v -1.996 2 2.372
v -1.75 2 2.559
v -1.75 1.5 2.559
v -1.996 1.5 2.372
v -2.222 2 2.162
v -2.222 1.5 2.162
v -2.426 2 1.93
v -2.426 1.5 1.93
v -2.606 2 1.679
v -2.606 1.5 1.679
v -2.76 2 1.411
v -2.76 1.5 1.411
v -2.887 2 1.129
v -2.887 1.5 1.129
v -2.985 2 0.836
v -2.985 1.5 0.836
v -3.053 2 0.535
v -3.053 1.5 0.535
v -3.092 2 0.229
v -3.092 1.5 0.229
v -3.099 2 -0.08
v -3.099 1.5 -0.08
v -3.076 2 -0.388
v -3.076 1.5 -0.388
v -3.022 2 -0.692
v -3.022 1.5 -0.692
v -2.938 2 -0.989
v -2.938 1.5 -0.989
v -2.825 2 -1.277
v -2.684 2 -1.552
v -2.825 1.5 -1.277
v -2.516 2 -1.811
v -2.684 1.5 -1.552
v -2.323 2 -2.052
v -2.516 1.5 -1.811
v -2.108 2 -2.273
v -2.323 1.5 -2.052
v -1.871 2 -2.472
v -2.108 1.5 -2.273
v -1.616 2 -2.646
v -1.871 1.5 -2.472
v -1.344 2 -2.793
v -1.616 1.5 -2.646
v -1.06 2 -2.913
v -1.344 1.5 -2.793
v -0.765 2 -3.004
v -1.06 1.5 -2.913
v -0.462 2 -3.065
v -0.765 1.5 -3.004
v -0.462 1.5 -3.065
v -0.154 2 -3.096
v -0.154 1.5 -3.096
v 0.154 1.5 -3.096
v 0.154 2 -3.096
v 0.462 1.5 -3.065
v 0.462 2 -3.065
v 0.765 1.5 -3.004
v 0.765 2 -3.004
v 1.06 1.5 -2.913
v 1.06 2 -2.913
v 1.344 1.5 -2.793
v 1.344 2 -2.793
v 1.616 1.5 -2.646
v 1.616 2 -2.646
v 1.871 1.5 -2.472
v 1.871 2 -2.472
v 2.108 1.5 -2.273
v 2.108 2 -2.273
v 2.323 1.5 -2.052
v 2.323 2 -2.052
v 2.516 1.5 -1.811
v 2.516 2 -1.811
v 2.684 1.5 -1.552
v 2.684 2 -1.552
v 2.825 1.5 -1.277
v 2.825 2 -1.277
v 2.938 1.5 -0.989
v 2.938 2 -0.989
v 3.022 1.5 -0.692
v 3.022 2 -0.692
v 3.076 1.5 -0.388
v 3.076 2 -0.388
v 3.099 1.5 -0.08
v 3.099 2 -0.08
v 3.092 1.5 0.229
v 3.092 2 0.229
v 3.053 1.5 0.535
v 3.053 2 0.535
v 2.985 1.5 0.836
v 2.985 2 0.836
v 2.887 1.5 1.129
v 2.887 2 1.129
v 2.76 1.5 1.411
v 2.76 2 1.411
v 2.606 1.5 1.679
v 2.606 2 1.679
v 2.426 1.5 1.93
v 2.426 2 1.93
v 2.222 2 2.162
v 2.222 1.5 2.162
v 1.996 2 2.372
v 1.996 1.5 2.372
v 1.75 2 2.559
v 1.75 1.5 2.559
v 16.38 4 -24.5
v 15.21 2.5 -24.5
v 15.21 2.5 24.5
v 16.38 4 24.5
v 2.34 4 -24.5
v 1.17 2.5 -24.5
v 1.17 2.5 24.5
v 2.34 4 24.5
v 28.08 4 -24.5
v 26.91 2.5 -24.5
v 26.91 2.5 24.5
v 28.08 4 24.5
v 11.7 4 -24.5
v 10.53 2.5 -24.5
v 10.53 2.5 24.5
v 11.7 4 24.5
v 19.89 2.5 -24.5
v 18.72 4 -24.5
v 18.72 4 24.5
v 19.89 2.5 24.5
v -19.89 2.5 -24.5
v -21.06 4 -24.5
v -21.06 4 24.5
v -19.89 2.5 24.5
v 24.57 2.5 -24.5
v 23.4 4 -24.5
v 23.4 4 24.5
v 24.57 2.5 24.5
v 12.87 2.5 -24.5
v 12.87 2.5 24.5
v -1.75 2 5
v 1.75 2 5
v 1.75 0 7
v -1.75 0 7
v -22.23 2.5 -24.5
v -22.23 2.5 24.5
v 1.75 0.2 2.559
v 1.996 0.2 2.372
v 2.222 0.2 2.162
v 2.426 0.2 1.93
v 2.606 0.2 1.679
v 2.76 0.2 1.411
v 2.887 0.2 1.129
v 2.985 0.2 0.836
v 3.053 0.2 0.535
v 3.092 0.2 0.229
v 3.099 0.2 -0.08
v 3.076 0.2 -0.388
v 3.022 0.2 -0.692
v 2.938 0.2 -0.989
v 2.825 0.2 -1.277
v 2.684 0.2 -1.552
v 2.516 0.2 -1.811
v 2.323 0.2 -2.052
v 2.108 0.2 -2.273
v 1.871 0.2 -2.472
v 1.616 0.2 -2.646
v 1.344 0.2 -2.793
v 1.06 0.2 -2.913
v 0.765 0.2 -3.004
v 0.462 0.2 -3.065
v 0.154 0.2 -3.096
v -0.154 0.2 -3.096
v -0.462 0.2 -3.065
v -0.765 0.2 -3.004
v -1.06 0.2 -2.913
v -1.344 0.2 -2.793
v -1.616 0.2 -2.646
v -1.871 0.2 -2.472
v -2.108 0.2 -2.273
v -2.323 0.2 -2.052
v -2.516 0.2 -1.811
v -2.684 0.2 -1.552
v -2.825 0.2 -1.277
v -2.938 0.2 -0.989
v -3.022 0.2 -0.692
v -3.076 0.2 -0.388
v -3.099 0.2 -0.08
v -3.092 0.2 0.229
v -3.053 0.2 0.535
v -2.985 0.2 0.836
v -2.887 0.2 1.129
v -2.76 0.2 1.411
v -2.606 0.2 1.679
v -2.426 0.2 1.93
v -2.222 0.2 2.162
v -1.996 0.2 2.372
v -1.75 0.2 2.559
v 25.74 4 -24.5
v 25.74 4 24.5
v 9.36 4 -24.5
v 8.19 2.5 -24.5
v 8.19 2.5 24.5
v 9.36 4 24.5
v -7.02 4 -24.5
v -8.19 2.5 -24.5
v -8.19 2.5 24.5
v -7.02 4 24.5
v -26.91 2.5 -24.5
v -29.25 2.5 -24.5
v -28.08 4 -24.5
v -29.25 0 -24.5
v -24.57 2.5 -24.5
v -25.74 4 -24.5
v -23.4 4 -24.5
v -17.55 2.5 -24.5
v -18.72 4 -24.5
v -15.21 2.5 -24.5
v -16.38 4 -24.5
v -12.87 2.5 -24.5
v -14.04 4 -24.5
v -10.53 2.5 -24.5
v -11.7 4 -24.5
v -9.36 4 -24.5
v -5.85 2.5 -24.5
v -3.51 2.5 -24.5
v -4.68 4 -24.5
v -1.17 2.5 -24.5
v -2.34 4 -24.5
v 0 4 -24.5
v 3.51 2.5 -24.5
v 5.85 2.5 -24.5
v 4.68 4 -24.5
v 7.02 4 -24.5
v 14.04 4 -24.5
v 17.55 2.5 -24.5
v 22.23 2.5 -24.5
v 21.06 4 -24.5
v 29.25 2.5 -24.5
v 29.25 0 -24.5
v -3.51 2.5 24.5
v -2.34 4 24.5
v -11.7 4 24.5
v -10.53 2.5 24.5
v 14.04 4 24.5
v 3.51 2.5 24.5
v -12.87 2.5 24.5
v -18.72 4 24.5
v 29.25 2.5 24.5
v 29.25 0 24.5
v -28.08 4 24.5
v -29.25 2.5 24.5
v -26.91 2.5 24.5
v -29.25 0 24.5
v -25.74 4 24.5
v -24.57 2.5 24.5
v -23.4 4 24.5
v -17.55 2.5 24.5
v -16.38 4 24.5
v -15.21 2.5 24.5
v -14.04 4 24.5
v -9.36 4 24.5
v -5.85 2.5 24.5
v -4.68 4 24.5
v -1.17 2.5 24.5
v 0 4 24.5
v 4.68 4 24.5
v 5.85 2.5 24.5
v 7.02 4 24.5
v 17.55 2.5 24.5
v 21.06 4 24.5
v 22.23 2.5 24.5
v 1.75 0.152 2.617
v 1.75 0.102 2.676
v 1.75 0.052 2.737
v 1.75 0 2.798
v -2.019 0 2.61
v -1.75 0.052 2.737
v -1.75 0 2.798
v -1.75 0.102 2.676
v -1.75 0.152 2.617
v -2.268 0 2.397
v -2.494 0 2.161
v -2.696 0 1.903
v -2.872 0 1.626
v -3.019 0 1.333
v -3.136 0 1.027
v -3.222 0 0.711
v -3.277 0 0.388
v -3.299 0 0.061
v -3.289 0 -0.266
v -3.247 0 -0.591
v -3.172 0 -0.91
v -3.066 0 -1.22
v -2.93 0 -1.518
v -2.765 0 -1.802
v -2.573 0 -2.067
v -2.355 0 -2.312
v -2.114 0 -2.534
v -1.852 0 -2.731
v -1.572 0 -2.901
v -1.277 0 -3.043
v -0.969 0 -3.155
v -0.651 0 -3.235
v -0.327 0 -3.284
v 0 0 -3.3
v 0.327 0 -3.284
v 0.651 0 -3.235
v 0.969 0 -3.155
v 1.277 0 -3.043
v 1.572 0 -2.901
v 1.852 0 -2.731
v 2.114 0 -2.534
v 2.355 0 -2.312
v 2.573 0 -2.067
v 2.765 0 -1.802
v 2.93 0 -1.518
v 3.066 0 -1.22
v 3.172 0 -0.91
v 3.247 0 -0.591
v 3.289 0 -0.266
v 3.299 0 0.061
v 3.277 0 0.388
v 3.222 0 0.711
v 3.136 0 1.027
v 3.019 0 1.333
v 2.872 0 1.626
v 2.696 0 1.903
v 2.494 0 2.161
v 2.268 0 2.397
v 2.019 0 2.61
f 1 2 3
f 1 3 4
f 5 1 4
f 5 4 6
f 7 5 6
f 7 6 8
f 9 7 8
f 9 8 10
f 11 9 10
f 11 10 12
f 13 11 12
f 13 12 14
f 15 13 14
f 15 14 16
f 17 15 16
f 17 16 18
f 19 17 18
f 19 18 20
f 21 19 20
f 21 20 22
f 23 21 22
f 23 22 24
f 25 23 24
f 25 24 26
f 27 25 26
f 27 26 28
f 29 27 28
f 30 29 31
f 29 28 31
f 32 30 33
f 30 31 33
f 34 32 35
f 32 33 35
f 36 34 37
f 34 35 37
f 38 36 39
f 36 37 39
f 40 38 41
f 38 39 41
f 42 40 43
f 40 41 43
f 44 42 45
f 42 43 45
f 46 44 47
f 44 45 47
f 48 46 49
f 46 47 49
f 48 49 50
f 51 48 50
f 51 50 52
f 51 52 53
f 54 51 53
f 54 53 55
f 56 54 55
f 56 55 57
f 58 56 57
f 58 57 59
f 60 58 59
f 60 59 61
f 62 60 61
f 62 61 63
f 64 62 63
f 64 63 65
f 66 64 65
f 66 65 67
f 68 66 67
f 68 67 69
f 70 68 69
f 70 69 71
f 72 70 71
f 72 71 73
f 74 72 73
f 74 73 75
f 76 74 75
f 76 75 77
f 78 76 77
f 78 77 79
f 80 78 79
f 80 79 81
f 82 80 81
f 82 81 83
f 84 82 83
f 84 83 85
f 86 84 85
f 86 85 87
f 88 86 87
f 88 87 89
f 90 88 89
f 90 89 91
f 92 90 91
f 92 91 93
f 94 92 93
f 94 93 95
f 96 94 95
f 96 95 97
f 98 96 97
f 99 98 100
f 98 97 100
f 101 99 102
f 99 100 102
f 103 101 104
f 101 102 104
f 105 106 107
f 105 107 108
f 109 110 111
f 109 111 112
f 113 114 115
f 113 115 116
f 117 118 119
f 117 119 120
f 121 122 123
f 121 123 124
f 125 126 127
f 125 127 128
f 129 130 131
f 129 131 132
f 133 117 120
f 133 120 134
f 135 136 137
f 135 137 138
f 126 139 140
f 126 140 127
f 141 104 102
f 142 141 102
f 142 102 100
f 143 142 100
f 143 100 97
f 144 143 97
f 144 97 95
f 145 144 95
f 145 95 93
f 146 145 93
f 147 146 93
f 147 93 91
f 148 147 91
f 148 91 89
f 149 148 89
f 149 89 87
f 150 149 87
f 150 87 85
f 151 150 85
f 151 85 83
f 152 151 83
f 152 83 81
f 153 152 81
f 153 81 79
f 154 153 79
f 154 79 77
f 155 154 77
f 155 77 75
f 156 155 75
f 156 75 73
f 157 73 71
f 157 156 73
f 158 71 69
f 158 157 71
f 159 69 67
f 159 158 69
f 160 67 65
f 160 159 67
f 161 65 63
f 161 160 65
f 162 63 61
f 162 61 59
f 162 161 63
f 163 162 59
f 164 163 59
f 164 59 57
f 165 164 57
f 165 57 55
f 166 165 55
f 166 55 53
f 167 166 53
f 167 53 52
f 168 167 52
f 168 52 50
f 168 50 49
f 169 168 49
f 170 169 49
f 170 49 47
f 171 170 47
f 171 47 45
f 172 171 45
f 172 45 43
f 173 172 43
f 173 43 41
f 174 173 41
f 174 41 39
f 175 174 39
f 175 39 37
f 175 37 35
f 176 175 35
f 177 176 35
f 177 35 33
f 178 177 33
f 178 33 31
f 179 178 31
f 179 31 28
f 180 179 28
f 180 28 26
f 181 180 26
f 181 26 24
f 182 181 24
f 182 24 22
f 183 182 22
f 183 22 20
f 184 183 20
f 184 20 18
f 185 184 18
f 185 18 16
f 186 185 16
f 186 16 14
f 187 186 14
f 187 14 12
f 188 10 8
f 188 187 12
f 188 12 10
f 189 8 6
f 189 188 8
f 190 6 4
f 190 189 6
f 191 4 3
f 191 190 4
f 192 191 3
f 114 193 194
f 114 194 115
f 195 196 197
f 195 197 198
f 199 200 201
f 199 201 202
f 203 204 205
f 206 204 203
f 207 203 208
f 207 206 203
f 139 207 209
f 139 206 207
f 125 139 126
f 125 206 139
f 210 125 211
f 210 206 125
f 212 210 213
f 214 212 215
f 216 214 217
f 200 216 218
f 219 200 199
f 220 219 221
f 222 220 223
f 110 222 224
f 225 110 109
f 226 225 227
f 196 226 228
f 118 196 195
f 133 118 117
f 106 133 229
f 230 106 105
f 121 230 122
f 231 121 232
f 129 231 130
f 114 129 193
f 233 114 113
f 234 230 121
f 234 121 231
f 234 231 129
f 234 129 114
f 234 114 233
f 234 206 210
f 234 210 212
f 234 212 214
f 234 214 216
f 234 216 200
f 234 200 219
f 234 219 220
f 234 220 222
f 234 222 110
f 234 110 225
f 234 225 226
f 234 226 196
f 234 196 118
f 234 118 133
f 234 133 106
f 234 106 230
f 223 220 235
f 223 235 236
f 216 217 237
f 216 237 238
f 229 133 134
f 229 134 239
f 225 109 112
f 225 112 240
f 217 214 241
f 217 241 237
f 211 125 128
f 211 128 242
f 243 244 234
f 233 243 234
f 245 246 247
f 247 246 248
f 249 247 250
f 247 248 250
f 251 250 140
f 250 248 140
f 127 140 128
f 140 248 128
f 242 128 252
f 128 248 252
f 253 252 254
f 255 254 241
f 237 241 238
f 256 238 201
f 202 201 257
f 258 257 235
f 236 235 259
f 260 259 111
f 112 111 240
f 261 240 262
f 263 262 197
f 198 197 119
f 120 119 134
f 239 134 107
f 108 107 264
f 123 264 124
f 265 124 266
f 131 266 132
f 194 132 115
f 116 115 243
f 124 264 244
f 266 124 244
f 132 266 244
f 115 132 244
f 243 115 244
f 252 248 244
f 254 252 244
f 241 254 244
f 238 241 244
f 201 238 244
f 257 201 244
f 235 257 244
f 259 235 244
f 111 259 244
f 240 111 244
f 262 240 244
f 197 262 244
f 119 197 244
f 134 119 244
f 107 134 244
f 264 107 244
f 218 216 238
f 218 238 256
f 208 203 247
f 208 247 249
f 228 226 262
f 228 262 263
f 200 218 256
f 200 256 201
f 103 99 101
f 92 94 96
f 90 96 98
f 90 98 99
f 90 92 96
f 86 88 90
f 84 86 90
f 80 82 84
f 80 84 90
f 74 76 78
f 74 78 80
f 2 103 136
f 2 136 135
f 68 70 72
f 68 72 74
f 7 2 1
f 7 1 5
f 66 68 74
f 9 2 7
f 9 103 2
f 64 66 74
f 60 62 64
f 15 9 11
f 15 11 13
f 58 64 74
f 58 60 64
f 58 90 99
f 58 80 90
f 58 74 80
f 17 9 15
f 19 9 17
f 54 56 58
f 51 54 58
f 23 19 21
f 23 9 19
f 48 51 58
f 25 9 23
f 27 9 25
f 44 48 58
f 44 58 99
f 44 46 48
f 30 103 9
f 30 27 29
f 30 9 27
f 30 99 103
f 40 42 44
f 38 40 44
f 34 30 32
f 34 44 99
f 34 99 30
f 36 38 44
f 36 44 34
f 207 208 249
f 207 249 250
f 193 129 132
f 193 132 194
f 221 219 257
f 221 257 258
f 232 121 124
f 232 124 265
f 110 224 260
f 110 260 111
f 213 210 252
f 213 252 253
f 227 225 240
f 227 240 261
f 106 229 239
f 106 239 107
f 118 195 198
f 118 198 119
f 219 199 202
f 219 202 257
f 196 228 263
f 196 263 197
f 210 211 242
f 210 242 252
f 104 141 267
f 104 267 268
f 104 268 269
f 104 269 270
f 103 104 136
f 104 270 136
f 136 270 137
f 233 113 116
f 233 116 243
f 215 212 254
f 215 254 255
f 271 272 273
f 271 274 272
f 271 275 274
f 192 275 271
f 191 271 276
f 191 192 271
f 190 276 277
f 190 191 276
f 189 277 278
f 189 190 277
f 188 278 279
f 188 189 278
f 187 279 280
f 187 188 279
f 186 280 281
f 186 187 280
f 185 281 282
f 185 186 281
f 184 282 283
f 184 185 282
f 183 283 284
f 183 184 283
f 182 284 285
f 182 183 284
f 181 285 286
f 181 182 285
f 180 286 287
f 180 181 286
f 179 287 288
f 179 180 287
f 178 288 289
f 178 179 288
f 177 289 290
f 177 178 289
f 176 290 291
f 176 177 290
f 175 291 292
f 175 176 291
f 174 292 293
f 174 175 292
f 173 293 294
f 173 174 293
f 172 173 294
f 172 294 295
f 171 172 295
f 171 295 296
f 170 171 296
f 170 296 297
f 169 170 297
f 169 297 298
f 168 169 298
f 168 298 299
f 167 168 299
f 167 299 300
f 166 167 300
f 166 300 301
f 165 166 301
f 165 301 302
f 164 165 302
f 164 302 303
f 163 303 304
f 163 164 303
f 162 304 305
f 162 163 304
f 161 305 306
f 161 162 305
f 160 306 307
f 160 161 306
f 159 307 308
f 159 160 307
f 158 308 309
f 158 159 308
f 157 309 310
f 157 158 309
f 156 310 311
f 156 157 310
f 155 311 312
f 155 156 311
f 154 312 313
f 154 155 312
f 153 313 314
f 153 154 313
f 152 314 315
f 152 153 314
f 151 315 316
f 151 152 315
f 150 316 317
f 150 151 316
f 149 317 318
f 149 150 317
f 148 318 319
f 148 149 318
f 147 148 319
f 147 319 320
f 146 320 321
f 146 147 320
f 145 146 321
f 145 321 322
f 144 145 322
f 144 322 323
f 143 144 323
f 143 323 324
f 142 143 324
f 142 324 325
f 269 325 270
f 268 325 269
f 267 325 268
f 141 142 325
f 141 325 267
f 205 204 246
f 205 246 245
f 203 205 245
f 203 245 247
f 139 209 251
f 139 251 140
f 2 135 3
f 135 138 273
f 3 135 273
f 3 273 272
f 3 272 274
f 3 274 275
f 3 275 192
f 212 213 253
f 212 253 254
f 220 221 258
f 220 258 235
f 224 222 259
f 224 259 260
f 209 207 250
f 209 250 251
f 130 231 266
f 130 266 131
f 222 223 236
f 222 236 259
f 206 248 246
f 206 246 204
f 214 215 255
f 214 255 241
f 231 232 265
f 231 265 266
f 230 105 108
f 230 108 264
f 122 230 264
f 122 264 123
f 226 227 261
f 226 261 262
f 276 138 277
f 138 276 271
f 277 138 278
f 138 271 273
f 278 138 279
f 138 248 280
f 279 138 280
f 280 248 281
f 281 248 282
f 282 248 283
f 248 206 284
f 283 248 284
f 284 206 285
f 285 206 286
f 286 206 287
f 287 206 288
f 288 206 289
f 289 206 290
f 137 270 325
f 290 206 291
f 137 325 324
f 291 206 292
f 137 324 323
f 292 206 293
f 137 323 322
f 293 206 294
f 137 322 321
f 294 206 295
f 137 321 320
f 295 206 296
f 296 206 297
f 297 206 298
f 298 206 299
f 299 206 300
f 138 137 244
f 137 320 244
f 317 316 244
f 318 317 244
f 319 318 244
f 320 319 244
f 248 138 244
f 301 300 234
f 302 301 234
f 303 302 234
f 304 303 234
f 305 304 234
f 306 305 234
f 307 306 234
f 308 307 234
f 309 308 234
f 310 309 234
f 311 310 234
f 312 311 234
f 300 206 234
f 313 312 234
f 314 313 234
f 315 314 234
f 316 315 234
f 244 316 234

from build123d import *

# Parameters (mm, degrees)
SKETCH1_W           = 58.5
SKETCH1_H           = 49
SKETCH1_R           = 3.1
BOSS_EXTRUDE1_DEPTH = 1.5
BOSS_EXTRUDE2_DEPTH = 49
CUT_EXTRUDE1_DEPTH  = 2
CHAMFER1_SIZE       = 2
CHAMFER2_SIZE       = 0.2


with BuildPart() as part:
    # Sketch1 → Boss-Extrude1 (new body)
    with BuildSketch(Plane(origin=(0, 0, 0), x_dir=(1, 0, 0), z_dir=(0, 1, 0))):
        Rectangle(SKETCH1_W, SKETCH1_H)
        with Locations(Location((0, 0, 0), (0, 0, 270))):
            Circle(SKETCH1_R, mode=Mode.SUBTRACT)
    extrude(amount=BOSS_EXTRUDE1_DEPTH)

    # Sketch2 → Boss-Extrude2 (add)
    with BuildSketch(Plane(origin=(0, 0, -24.5), x_dir=(-1, 0, 0), z_dir=(0, 0, -1))):
        Polygon((-29.25, 1.5), (29.25, 1.5), (29.25, 2.5), (28.08, 4), (26.91, 2.5), (25.74, 4), (24.57, 2.5), (23.4, 4), (22.23, 2.5), (21.06, 4), (19.89, 2.5), (18.72, 4), (17.55, 2.5), (16.38, 4), (15.21, 2.5), (14.04, 4), (12.87, 2.5), (11.7, 4), (10.53, 2.5), (9.36, 4), (8.19, 2.5), (7.02, 4), (5.85, 2.5), (4.68, 4), (3.51, 2.5), (2.34, 4), (1.17, 2.5), (0, 4), (-1.17, 2.5), (-2.34, 4), (-3.51, 2.5), (-4.68, 4), (-5.85, 2.5), (-7.02, 4), (-8.19, 2.5), (-9.36, 4), (-10.53, 2.5), (-11.7, 4), (-12.87, 2.5), (-14.04, 4), (-15.21, 2.5), (-16.38, 4), (-17.55, 2.5), (-18.72, 4), (-19.89, 2.5), (-21.06, 4), (-22.23, 2.5), (-23.4, 4), (-24.57, 2.5), (-25.74, 4), (-26.91, 2.5), (-28.08, 4), (-29.25, 2.5), align=None)
    extrude(amount=-BOSS_EXTRUDE2_DEPTH)

    # Sketch3 → Cut-Extrude1 (cut)
    with BuildSketch(Plane(origin=(0, 0, 0), x_dir=(-1, 0, 0), z_dir=(0, -1, 0))):
        with BuildLine():
            Line((-1.75, -2.558808316), (-1.75, -5))
            Line((-1.75, -5), (1.75, -5))
            Line((1.75, -5), (1.75, -2.558808316))
            ThreePointArc((1.75, -2.558808316), (0, 3.1), (-1.75, -2.558808316))
        make_face()
    extrude(amount=-CUT_EXTRUDE1_DEPTH, mode=Mode.SUBTRACT)

    # Chamfer1
    chamfer1_edges = [part.edges().sort_by_distance(p)[0] for p in [
        (0, 0, 5),
    ]]
    chamfer(chamfer1_edges, length=CHAMFER1_SIZE - 0.0001)  # a hair under: the kernel refuses the full size

    # Chamfer2
    chamfer2_edges = [part.edges().sort_by_distance(p)[0] for p in [
        (0, 0, -3.1),
    ]]
    chamfer(chamfer2_edges, length=CHAMFER2_SIZE)


solid = part.part
